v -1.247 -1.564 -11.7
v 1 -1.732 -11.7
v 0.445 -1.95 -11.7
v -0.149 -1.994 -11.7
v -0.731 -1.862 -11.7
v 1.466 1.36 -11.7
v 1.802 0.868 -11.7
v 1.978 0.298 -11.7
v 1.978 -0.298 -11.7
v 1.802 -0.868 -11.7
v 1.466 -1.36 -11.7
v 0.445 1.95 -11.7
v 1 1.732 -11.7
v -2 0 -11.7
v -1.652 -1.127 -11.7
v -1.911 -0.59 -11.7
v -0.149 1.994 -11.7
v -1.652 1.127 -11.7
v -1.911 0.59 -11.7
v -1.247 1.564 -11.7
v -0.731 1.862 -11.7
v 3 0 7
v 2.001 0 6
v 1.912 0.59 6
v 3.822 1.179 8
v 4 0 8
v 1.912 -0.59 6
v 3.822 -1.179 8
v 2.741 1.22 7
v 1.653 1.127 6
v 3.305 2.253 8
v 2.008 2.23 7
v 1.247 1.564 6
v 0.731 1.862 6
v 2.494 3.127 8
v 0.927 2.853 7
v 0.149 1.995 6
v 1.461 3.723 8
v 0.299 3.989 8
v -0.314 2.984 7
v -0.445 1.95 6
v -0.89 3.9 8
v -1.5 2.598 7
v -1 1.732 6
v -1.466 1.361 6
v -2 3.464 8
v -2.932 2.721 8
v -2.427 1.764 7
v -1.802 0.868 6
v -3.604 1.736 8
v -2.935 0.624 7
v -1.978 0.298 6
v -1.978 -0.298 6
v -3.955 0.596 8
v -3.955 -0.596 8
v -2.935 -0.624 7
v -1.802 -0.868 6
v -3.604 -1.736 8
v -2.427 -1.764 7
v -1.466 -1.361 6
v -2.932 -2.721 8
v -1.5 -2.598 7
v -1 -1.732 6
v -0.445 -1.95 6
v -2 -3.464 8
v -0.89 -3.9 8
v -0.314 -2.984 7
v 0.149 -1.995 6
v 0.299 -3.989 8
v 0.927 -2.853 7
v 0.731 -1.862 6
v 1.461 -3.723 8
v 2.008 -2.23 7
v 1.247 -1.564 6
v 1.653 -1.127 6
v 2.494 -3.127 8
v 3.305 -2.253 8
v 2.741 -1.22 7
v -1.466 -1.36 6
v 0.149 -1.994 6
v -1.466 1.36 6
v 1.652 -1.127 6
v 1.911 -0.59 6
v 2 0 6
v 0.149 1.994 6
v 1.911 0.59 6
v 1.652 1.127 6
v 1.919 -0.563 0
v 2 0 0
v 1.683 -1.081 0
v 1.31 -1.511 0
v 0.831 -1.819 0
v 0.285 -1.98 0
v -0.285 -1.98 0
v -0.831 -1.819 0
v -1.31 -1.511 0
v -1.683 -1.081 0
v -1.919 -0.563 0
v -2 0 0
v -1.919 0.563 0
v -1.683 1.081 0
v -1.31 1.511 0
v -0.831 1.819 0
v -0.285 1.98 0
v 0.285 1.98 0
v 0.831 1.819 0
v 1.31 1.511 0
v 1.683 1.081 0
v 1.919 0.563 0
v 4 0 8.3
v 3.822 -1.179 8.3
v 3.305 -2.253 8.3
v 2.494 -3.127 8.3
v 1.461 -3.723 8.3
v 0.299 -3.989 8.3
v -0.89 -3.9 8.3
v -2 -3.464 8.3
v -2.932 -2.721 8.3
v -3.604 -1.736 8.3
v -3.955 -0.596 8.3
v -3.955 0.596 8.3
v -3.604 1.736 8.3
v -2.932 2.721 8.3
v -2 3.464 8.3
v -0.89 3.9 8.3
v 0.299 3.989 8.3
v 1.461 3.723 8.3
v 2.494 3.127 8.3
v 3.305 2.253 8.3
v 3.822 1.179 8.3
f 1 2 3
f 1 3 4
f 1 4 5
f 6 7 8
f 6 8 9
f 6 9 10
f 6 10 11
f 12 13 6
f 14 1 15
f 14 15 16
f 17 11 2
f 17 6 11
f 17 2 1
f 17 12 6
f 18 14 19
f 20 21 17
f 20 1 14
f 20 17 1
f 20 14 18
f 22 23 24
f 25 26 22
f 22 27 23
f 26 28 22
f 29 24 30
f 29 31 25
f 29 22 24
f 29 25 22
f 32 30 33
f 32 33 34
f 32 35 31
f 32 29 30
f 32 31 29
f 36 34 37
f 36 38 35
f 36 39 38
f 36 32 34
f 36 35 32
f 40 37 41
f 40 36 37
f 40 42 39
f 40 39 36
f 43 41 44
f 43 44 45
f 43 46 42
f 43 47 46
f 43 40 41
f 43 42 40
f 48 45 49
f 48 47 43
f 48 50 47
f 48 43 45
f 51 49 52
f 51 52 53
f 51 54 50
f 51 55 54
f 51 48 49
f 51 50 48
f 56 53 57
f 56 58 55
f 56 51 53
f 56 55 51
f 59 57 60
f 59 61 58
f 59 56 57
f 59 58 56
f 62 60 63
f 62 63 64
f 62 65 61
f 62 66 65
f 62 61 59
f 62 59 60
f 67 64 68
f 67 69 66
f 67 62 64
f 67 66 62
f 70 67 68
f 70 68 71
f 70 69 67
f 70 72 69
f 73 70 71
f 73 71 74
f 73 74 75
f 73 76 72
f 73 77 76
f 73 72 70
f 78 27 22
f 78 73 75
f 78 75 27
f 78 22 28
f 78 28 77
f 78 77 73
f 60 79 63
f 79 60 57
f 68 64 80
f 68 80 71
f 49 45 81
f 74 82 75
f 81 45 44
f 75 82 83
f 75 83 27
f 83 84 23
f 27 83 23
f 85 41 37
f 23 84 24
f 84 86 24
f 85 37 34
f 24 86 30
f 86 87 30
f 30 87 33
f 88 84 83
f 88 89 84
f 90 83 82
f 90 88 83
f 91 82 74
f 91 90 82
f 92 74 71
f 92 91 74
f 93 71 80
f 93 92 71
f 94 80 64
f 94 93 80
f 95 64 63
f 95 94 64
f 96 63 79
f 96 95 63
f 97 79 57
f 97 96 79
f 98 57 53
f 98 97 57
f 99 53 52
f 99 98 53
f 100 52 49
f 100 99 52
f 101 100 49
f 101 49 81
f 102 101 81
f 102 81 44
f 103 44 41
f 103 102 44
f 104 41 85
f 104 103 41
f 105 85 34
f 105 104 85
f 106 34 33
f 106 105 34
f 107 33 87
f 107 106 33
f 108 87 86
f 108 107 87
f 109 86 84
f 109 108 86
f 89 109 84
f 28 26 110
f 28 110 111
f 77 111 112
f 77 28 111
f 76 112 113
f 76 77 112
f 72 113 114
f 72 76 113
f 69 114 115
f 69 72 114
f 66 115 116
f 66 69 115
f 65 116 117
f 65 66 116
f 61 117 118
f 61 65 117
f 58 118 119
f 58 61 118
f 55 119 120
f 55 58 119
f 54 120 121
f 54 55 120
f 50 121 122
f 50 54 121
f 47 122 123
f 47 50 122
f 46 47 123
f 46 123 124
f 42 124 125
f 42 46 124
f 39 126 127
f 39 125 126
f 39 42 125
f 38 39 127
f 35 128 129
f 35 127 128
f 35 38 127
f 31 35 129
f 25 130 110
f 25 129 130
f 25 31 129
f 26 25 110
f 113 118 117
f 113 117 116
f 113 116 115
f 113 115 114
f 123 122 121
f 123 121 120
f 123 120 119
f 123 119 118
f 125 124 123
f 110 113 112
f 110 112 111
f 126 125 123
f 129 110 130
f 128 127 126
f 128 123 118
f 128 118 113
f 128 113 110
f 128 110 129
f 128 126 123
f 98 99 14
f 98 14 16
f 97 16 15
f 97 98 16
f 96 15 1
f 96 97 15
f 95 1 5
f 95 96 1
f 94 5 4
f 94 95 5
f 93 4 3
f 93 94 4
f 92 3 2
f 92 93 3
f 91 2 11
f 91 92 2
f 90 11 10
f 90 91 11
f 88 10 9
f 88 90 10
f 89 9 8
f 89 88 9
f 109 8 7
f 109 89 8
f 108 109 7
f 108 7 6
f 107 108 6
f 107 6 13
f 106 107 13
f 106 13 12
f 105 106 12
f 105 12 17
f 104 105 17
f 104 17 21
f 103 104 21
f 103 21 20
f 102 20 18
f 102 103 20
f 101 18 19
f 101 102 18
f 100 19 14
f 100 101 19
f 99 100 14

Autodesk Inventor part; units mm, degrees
ref_plane "YZ Plane" through (0, 0, 0) normal (1, 0, 0) x (0, 1, 0)
ref_plane "XZ Plane" through (0, 0, 0) normal (0, 1, 0) x (-1, 0, 0)
ref_plane "XY Plane" through (0, 0, 0) normal (0, 0, 1) x (1, 0, 0)
sketch "スケッチ1" plane through (0, 0, 0) normal (0, 0, 1) x (1, 0, 0)
  circle A0 centre (0, 0) radius 2
  dimension "d0" = 4
extrude "押し出し1" add sketch "スケッチ1" along normal blind 6
sketch "スケッチ2" plane through (0, 0, 6) normal (0, 0, 1) x (1, 0, 0)
  circle A0 centre (0, 0) radius 2 projected
  circle A1 centre (0, 0) radius 4
  dimension "d3" = 8
extrude "押し出し2" add sketch "スケッチ2" along normal blind 2.3 contours A0 | A1
thread "ねじ1" size "M4x0.7" class "6g" standard "ANSI Metric M Profile" full length
chamfer "面取り1" distance 2 angle 45 1 edges at (-4, 0, 6)
sketch "スケッチ4" plane through (0, 0, 0) normal (0, 0, -1) x (-1, 0, 0)
  circle A0 centre (0, 0) radius 2
extrude "押し出し4" add sketch "スケッチ4" along normal blind 11.7
properties part number "SB　M4 20mm 皿ネジ" material "Stainless Steel, 440C"
